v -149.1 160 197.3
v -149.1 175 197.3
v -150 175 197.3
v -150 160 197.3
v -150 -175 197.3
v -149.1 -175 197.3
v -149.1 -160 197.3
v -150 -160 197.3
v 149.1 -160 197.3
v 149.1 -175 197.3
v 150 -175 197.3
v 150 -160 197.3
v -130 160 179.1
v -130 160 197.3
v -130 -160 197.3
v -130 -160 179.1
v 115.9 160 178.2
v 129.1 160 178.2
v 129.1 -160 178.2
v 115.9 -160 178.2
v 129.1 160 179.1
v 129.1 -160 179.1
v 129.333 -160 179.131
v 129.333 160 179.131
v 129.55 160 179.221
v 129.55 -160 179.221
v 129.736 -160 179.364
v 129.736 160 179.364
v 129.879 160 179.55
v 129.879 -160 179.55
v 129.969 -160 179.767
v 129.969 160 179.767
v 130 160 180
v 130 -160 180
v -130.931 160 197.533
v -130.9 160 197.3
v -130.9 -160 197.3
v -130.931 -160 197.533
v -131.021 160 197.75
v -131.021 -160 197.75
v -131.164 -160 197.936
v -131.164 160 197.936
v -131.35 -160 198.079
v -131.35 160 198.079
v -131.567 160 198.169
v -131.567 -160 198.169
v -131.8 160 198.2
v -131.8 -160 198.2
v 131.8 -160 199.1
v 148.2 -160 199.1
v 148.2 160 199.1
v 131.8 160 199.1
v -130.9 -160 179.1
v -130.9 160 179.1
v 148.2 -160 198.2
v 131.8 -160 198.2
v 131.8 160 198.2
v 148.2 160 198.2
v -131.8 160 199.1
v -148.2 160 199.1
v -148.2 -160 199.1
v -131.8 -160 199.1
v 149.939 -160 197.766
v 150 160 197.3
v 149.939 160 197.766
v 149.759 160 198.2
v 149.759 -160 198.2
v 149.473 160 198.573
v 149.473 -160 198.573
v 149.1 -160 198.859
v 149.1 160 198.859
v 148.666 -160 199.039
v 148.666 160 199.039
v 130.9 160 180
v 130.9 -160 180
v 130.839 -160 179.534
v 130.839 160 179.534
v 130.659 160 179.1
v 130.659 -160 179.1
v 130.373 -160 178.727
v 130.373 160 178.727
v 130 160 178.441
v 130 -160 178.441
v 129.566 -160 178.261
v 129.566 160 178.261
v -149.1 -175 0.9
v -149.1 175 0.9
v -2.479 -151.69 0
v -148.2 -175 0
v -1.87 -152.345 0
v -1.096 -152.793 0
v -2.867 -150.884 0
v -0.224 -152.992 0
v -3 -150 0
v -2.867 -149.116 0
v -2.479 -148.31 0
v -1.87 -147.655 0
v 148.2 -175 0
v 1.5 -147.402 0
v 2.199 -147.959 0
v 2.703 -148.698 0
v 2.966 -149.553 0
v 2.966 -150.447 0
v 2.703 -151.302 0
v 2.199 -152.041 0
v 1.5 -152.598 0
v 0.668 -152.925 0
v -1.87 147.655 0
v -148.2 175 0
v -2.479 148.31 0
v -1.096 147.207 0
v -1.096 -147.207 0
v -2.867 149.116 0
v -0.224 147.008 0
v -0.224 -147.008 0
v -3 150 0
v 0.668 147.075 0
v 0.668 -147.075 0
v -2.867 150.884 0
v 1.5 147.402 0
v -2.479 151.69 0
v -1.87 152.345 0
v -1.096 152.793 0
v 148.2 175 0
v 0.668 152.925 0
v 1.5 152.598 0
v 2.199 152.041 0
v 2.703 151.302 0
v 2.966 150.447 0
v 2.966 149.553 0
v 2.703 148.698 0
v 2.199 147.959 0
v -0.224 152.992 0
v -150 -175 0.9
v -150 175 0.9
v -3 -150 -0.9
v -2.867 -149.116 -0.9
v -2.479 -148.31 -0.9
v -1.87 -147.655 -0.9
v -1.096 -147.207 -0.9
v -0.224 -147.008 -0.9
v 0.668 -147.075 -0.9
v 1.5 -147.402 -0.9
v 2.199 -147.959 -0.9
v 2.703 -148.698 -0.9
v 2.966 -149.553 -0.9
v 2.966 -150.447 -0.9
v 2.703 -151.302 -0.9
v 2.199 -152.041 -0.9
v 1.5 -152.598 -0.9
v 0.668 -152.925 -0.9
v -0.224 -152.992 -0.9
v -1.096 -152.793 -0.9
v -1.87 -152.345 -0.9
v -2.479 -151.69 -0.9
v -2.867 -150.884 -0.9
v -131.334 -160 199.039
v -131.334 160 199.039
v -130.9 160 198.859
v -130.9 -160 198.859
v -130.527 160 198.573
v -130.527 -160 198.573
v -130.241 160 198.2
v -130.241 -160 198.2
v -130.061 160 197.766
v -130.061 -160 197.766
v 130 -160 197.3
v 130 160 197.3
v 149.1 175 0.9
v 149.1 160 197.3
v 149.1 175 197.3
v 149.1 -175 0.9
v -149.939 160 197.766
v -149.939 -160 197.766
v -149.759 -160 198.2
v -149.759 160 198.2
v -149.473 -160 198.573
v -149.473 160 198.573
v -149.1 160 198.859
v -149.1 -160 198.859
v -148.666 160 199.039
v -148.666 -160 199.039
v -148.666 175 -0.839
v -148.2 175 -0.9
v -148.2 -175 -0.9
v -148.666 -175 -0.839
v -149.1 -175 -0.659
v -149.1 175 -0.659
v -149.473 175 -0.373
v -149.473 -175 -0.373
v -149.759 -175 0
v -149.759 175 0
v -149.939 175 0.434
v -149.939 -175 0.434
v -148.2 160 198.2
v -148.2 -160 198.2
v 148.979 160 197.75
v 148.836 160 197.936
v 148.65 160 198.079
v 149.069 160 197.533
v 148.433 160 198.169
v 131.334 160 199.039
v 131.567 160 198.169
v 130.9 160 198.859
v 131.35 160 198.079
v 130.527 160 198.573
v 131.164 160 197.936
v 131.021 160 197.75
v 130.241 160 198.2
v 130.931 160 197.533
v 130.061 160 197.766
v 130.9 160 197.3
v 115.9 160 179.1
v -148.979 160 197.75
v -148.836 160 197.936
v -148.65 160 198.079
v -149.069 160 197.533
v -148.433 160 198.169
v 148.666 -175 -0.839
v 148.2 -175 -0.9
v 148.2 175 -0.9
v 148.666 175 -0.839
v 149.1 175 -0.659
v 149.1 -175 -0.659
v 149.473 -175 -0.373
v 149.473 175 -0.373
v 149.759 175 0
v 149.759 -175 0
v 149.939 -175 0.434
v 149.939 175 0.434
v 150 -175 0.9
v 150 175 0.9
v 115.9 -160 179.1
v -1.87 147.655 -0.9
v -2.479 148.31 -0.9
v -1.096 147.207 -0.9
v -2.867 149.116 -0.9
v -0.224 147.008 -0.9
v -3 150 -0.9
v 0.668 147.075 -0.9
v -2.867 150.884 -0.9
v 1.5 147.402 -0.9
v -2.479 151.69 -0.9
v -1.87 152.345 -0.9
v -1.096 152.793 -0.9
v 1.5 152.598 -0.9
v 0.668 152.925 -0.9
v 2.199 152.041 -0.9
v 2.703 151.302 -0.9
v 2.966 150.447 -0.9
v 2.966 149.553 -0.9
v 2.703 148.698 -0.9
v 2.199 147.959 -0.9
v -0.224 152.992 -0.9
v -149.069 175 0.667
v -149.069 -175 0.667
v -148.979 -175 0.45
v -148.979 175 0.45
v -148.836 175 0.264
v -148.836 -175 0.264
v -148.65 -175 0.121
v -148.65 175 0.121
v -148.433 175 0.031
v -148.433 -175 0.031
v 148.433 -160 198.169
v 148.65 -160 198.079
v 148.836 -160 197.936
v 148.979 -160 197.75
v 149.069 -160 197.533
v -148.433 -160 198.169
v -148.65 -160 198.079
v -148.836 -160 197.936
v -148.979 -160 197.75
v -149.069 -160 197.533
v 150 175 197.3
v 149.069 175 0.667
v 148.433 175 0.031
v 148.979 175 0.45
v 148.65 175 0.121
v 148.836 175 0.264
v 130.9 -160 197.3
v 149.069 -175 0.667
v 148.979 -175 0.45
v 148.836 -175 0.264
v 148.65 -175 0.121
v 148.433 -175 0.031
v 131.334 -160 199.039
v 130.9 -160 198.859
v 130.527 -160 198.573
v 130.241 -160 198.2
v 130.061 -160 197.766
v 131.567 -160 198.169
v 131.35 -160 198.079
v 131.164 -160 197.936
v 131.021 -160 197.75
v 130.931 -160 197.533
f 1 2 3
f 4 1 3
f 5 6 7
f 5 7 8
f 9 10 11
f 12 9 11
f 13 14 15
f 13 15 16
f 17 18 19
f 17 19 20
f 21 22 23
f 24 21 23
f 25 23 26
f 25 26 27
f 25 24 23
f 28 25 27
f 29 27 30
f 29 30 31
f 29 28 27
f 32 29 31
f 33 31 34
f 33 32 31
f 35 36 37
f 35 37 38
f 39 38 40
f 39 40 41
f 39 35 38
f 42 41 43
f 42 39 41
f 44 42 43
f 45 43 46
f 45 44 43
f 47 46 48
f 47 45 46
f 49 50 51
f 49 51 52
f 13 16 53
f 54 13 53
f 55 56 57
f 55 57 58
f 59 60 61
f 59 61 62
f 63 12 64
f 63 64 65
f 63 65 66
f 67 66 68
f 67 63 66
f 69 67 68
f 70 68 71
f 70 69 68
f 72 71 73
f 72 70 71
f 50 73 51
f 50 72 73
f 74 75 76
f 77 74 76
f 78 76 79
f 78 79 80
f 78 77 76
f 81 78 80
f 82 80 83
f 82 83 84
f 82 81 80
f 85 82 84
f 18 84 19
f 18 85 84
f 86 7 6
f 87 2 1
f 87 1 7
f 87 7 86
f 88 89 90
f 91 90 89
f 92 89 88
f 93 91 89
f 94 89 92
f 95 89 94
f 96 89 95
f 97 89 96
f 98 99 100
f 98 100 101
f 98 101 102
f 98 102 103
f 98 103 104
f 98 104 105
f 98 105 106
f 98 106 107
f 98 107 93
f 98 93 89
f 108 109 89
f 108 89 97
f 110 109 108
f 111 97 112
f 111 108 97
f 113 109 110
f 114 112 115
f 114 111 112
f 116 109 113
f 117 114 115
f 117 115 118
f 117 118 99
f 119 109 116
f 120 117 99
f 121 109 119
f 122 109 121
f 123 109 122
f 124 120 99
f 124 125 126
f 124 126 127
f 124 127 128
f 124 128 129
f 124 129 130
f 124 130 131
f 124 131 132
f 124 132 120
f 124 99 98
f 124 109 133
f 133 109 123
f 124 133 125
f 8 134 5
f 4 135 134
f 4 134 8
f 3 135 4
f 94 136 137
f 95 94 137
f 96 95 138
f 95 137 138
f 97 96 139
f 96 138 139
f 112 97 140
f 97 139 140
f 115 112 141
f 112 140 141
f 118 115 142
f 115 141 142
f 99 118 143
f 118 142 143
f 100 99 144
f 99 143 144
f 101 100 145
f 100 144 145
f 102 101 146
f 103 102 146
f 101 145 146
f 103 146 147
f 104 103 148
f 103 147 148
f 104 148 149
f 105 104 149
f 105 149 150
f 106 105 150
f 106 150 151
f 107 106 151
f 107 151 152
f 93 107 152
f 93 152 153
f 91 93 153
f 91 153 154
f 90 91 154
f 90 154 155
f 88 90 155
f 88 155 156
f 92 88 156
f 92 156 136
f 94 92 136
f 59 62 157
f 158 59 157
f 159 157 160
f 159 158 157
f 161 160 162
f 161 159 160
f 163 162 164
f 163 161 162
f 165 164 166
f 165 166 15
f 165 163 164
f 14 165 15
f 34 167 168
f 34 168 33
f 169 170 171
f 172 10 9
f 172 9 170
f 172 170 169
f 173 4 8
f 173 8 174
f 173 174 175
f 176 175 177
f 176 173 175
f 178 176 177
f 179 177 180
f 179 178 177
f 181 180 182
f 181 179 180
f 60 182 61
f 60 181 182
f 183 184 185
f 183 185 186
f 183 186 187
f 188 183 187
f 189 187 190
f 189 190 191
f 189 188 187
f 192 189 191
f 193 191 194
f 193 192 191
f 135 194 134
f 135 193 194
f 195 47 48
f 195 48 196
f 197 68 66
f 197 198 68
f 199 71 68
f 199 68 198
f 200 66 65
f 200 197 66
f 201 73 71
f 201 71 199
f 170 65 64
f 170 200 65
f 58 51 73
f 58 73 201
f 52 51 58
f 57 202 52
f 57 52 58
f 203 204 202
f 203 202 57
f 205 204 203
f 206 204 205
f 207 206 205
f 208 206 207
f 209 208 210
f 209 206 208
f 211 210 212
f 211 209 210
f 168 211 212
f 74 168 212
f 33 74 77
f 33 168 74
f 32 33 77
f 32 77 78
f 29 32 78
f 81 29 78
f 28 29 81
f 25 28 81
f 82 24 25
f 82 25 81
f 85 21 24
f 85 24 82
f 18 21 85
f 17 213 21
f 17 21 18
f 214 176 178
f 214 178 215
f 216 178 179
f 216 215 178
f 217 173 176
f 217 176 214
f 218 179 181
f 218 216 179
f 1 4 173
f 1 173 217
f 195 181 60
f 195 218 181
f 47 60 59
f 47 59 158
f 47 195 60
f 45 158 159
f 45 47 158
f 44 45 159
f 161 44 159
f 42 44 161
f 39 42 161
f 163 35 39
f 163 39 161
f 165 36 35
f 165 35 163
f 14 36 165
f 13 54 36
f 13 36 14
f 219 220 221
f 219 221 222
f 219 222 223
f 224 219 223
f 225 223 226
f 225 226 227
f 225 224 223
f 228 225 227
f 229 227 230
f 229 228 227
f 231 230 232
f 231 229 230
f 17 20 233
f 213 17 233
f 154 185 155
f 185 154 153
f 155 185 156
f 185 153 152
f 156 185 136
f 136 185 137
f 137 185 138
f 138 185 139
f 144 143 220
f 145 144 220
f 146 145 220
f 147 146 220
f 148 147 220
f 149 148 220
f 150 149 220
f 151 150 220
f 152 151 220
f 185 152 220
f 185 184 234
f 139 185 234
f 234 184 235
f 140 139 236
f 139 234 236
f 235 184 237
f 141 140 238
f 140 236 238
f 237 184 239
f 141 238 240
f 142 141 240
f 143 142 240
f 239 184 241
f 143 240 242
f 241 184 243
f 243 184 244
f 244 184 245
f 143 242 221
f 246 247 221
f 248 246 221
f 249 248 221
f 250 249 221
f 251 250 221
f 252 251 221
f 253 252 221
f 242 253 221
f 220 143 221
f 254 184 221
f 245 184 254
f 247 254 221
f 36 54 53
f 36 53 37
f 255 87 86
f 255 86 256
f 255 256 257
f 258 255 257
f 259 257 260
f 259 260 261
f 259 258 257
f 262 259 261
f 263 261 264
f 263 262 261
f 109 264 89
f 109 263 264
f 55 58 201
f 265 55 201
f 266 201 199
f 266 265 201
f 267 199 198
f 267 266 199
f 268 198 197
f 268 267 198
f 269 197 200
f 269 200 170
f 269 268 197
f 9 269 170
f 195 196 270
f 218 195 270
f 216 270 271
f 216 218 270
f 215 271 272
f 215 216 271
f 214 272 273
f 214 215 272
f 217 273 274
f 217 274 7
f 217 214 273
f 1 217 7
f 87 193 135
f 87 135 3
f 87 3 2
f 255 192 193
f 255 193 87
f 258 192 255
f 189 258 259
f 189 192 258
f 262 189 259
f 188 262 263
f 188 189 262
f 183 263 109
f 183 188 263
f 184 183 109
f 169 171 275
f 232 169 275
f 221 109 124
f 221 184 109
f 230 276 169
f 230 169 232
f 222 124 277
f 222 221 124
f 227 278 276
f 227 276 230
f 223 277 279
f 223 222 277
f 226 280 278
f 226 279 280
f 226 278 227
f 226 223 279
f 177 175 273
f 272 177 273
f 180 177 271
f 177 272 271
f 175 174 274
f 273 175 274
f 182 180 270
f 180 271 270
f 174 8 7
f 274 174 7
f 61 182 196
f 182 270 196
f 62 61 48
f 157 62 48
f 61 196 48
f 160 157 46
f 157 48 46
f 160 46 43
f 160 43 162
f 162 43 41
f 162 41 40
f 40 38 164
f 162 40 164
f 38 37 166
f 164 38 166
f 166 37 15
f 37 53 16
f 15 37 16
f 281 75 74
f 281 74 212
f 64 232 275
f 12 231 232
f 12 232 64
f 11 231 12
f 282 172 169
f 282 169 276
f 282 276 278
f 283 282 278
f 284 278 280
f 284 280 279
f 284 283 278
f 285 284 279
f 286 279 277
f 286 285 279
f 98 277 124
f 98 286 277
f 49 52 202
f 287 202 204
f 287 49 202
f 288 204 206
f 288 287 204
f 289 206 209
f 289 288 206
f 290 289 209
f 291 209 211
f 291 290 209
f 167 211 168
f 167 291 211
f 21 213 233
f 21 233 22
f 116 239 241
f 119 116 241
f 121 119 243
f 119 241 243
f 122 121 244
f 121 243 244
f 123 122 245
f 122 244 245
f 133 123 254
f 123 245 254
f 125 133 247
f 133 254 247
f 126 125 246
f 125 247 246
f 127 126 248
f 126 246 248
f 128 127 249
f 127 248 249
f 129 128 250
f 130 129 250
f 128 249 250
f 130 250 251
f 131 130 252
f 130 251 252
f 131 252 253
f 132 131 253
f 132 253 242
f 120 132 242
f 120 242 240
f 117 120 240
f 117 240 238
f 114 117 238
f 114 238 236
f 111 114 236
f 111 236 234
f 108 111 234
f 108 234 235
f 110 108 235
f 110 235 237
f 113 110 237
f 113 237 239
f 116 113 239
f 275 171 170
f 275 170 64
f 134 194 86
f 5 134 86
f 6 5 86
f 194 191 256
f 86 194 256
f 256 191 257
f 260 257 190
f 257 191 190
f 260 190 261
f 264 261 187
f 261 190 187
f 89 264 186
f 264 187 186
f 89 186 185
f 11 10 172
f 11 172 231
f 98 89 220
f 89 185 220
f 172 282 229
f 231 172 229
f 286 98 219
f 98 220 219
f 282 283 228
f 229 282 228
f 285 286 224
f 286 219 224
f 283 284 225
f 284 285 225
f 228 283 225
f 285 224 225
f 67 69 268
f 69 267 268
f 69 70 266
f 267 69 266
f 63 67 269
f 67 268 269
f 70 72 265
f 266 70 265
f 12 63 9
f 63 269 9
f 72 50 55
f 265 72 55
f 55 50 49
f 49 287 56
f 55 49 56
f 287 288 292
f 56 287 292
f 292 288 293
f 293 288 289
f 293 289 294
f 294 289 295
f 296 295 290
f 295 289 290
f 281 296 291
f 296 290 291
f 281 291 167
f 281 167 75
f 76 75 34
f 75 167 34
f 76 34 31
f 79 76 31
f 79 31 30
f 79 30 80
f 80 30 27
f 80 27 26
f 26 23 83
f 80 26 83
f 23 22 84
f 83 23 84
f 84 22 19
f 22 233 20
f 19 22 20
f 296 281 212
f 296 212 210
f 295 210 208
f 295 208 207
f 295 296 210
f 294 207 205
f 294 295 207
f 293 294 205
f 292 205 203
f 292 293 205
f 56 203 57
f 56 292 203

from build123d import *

# Parameters (mm, degrees)
SKETCH1_W                      = 300
SKETCH1_H                      = 350
BASE_FLANGE1_DEPTH             = 0.9
EDGE_FLANGE1_STRIP_W           = 5.4
EDGE_FLANGE1_STRIP_H           = 0.9
EDGE_FLANGE1_STRIP_CUT_DEPTH   = 350
EDGE_FLANGE1_STRIP_2_W         = 5.4
EDGE_FLANGE1_STRIP_2_H         = 0.9
EDGE_FLANGE1_STRIP_CUT_2_DEPTH = 350
EDGE_FLANGE1_DEPTH             = 350
EDGE_FLANGE1_BEND_DEPTH        = 350
EDGE_FLANGE2_STRIP_W           = 5.4
EDGE_FLANGE2_STRIP_H           = 0.9
EDGE_FLANGE2_STRIP_CUT_DEPTH   = 350
EDGE_FLANGE2_STRIP_2_W         = 5.4
EDGE_FLANGE2_STRIP_2_H         = 0.9
EDGE_FLANGE2_STRIP_CUT_2_DEPTH = 350
EDGE_FLANGE2_DEPTH             = 350
EDGE_FLANGE2_BEND_DEPTH        = 350
EDGE_FLANGE3_STRIP_W           = 5.4
EDGE_FLANGE3_STRIP_H           = 0.9
EDGE_FLANGE3_STRIP_CUT_DEPTH   = 350
EDGE_FLANGE3_STRIP_2_W         = 5.4
EDGE_FLANGE3_STRIP_2_H         = 0.9
EDGE_FLANGE3_STRIP_CUT_2_DEPTH = 350
EDGE_FLANGE3_DEPTH             = 350
EDGE_FLANGE3_BEND_DEPTH        = 350
CUT_EXTRUDE1_START             = 160
CUT_EXTRUDE1_DEPTH             = 15
MIRROR2_START                  = 160
MIRROR2_COPY_1_DEPTH           = 15
EDGE_FLANGE4_STRIP_W           = 5.4
EDGE_FLANGE4_STRIP_H           = 0.9
EDGE_FLANGE4_STRIP_CUT_DEPTH   = 320
EDGE_FLANGE4_DEPTH             = 320
SKETCH28_R                     = 3
CUT_EXTRUDE2_DEPTH             = 10


# Read off the part's stored shape, not the designer's step: Cut-Extrude1
# Sheet-metal steps are written as plain solids
with BuildPart() as part:
    # Sketch1 → Base-Flange1 (new body)
    with BuildSketch(Plane.XY):
        Rectangle(SKETCH1_W, SKETCH1_H)
    extrude(amount=-BASE_FLANGE1_DEPTH)

    # Edge-Flange1 strip (across the edge) → Edge-Flange1 strip cut (cut)
    with BuildSketch(Plane(origin=(-150, 175, 0), x_dir=(1, 0, 0), z_dir=(0, -1, 0))):
        with Locations((-0.9, -0.45)):
            Rectangle(EDGE_FLANGE1_STRIP_W, EDGE_FLANGE1_STRIP_H)
    extrude(amount=EDGE_FLANGE1_STRIP_CUT_DEPTH, mode=Mode.SUBTRACT)

    # Edge-Flange1 strip 2 (across the edge) → Edge-Flange1 strip cut 2 (cut)
    with BuildSketch(Plane(origin=(150, -175, 0), x_dir=(-1, 0, 0), z_dir=(0, 1, 0))):
        with Locations((-0.9, -0.45)):
            Rectangle(EDGE_FLANGE1_STRIP_2_W, EDGE_FLANGE1_STRIP_2_H)
    extrude(amount=EDGE_FLANGE1_STRIP_CUT_2_DEPTH, mode=Mode.SUBTRACT)

    # Edge-Flange1 section (across the edge) → Edge-Flange1 (add)
    with BuildSketch(Plane(origin=(-150, 175, 0), x_dir=(1, 0, 0), z_dir=(0, -1, 0))):
        with BuildLine():
            Line((0, 0.9), (0, 199.1))
            Line((0, 199.1), (0.9, 199.1))
            Line((0.9, 199.1), (0.9, 0.9))
            ThreePointArc((0.9, 0.9), (1.163603897, 0.263603897), (1.8, 0))
            Line((1.8, 0), (1.8, -0.9))
            ThreePointArc((1.8, -0.9), (0.527207794, -0.372792206), (0, 0.9))
        make_face()
    extrude(amount=EDGE_FLANGE1_DEPTH)

    # Edge-Flange1 section 2 (across the edge) → Edge-Flange1 bend (add)
    with BuildSketch(Plane(origin=(150, -175, 0), x_dir=(-1, 0, 0), z_dir=(0, 1, 0))):
        with BuildLine():
            Line((0, 0.9), (0, 199.1))
            Line((0, 199.1), (0.9, 199.1))
            Line((0.9, 199.1), (0.9, 0.9))
            ThreePointArc((0.9, 0.9), (1.163603897, 0.263603897), (1.8, 0))
            Line((1.8, 0), (1.8, -0.9))
            ThreePointArc((1.8, -0.9), (0.527207794, -0.372792206), (0, 0.9))
        make_face()
    extrude(amount=EDGE_FLANGE1_BEND_DEPTH)

    # Edge-Flange2 strip (across the edge) → Edge-Flange2 strip cut (cut)
    with BuildSketch(Plane(origin=(-149.1, 175, 199.1), x_dir=(0, 0, -1), z_dir=(0, -1, 0))):
        with Locations((-0.9, -0.45)):
            Rectangle(EDGE_FLANGE2_STRIP_W, EDGE_FLANGE2_STRIP_H)
    extrude(amount=EDGE_FLANGE2_STRIP_CUT_DEPTH, mode=Mode.SUBTRACT)

    # Edge-Flange2 strip 2 (across the edge) → Edge-Flange2 strip cut 2 (cut)
    with BuildSketch(Plane(origin=(149.1, -175, 199.1), x_dir=(0, 0, -1), z_dir=(0, 1, 0))):
        with Locations((-0.9, -0.45)):
            Rectangle(EDGE_FLANGE2_STRIP_2_W, EDGE_FLANGE2_STRIP_2_H)
    extrude(amount=EDGE_FLANGE2_STRIP_CUT_2_DEPTH, mode=Mode.SUBTRACT)

    # Edge-Flange2 section (across the edge) → Edge-Flange2 (add)
    with BuildSketch(Plane(origin=(-149.1, 175, 199.1), x_dir=(0, 0, -1), z_dir=(0, -1, 0))):
        with BuildLine():
            Line((0, 0.9), (0, 19.1))
            Line((0, 19.1), (0.9, 19.1))
            Line((0.9, 19.1), (0.9, 0.9))
            ThreePointArc((0.9, 0.9), (1.163603897, 0.263603897), (1.8, 0))
            Line((1.8, 0), (1.8, -0.9))
            ThreePointArc((1.8, -0.9), (0.527207794, -0.372792206), (0, 0.9))
        make_face()
    extrude(amount=EDGE_FLANGE2_DEPTH)

    # Edge-Flange2 section 2 (across the edge) → Edge-Flange2 bend (add)
    with BuildSketch(Plane(origin=(149.1, -175, 199.1), x_dir=(0, 0, -1), z_dir=(0, 1, 0))):
        with BuildLine():
            Line((0, 0.9), (0, 19.1))
            Line((0, 19.1), (0.9, 19.1))
            Line((0.9, 19.1), (0.9, 0.9))
            ThreePointArc((0.9, 0.9), (1.163603897, 0.263603897), (1.8, 0))
            Line((1.8, 0), (1.8, -0.9))
            ThreePointArc((1.8, -0.9), (0.527207794, -0.372792206), (0, 0.9))
        make_face()
    extrude(amount=EDGE_FLANGE2_BEND_DEPTH)

    # Edge-Flange3 strip (across the edge) → Edge-Flange3 strip cut (cut)
    with BuildSketch(Plane(origin=(130, -175, 198.2), x_dir=(1, 0, 0), z_dir=(0, 1, 0))):
        with Locations((-0.9, -0.45)):
            Rectangle(EDGE_FLANGE3_STRIP_W, EDGE_FLANGE3_STRIP_H)
    extrude(amount=EDGE_FLANGE3_STRIP_CUT_DEPTH, mode=Mode.SUBTRACT)

    # Edge-Flange3 strip 2 (across the edge) → Edge-Flange3 strip cut 2 (cut)
    with BuildSketch(Plane(origin=(-130, 175, 198.2), x_dir=(-1, 0, 0), z_dir=(0, -1, 0))):
        with Locations((-0.9, -0.45)):
            Rectangle(EDGE_FLANGE3_STRIP_2_W, EDGE_FLANGE3_STRIP_2_H)
    extrude(amount=EDGE_FLANGE3_STRIP_CUT_2_DEPTH, mode=Mode.SUBTRACT)

    # Edge-Flange3 section (across the edge) → Edge-Flange3 (add)
    with BuildSketch(Plane(origin=(130, -175, 198.2), x_dir=(1, 0, 0), z_dir=(0, 1, 0))):
        with BuildLine():
            Line((0, 0.9), (0, 19.1))
            Line((0, 19.1), (0.9, 19.1))
            Line((0.9, 19.1), (0.9, 0.9))
            ThreePointArc((0.9, 0.9), (1.163603897, 0.263603897), (1.8, 0))
            Line((1.8, 0), (1.8, -0.9))
            ThreePointArc((1.8, -0.9), (0.527207794, -0.372792206), (0, 0.9))
        make_face()
    extrude(amount=EDGE_FLANGE3_DEPTH)

    # Edge-Flange3 section 2 (across the edge) → Edge-Flange3 bend (add)
    with BuildSketch(Plane(origin=(-130, 175, 198.2), x_dir=(-1, 0, 0), z_dir=(0, -1, 0))):
        with BuildLine():
            Line((0, 0.9), (0, 19.1))
            Line((0, 19.1), (0.9, 19.1))
            Line((0.9, 19.1), (0.9, 0.9))
            ThreePointArc((0.9, 0.9), (1.163603897, 0.263603897), (1.8, 0))
            Line((1.8, 0), (1.8, -0.9))
            ThreePointArc((1.8, -0.9), (0.527207794, -0.372792206), (0, 0.9))
        make_face()
    extrude(amount=EDGE_FLANGE3_BEND_DEPTH)

    # Cut-Extrude1 outline → Cut-Extrude1 (cut)
    with BuildSketch(Plane(origin=(0, 0, 0), x_dir=(1, 0, 0), z_dir=(0, 1, 0)).offset(CUT_EXTRUDE1_START)):
        with BuildLine():
            ThreePointArc((-148.2, -198.2), (-148.836396103, -197.936396103), (-149.1, -197.3))
            Line((-149.1, -197.3), (-150, -197.3))
            ThreePointArc((-150, -197.3), (-149.472792206, -198.572792206), (-148.2, -199.1))
            Line((-148.2, -199.1), (-131.8, -199.1))
            ThreePointArc((-131.8, -199.1), (-130.527207794, -198.572792206), (-130, -197.3))
            Line((-130, -197.3), (-130, -179.1))
            Line((-130, -179.1), (-130.9, -179.1))
            Line((-130.9, -179.1), (-130.9, -197.3))
            ThreePointArc((-130.9, -197.3), (-131.163603897, -197.936396103), (-131.8, -198.2))
            Line((-131.8, -198.2), (-148.2, -198.2))
        make_face()
    cut_extrude1 = extrude(amount=CUT_EXTRUDE1_DEPTH, mode=Mode.SUBTRACT)

    # Mirror1: Cut-Extrude1 across plane
    add(cut_extrude1.mirror(Plane(origin=(0, 0, 0), x_dir=(0, 0, 1), z_dir=(1, 0, 0))), mode=Mode.SUBTRACT)

    # Mirror2: Cut-Extrude1 across plane
    add(cut_extrude1.mirror(Plane.ZX), mode=Mode.SUBTRACT)

    # Mirror2 copy 1 sketch → Mirror2 copy 1 (cut)
    with BuildSketch(Plane(origin=(0, 0, 0), x_dir=(-1, 0, 0), z_dir=(0, -1, 0)).offset(MIRROR2_START)):
        with BuildLine():
            ThreePointArc((-148.2, -198.2), (-148.836396103, -197.936396103), (-149.1, -197.3))
            Line((-149.1, -197.3), (-150, -197.3))
            ThreePointArc((-150, -197.3), (-149.472792206, -198.572792206), (-148.2, -199.1))
            Line((-148.2, -199.1), (-131.8, -199.1))
            ThreePointArc((-131.8, -199.1), (-130.527207794, -198.572792206), (-130, -197.3))
            Line((-130, -197.3), (-130, -179.1))
            Line((-130, -179.1), (-130.9, -179.1))
            Line((-130.9, -179.1), (-130.9, -197.3))
            ThreePointArc((-130.9, -197.3), (-131.163603897, -197.936396103), (-131.8, -198.2))
            Line((-131.8, -198.2), (-148.2, -198.2))
        make_face()
    extrude(amount=MIRROR2_COPY_1_DEPTH, mode=Mode.SUBTRACT)

    # Edge-Flange4 strip (across the edge) → Edge-Flange4 strip cut (cut)
    with BuildSketch(Plane(origin=(130, 160, 179.1), x_dir=(0, 0, 1), z_dir=(0, -1, 0))):
        with Locations((-1.8, -0.45)):
            Rectangle(EDGE_FLANGE4_STRIP_W, EDGE_FLANGE4_STRIP_H)
    extrude(amount=EDGE_FLANGE4_STRIP_CUT_DEPTH, mode=Mode.SUBTRACT)

    # Edge-Flange4 section (across the edge) → Edge-Flange4 (add)
    with BuildSketch(Plane(origin=(130, 160, 179.1), x_dir=(0, 0, 1), z_dir=(0, -1, 0))):
        with BuildLine():
            Line((-0.9, 0.9), (-0.9, 14.1))
            Line((-0.9, 14.1), (0, 14.1))
            Line((0, 14.1), (0, 0.9))
            ThreePointArc((0, 0.9), (0.263603897, 0.263603897), (0.9, 0))
            Line((0.9, 0), (0.9, -0.9))
            ThreePointArc((0.9, -0.9), (-0.372792206, -0.372792206), (-0.9, 0.9))
        make_face()
    extrude(amount=EDGE_FLANGE4_DEPTH)

    # Sketch28 → Cut-Extrude2 (cut)
    with BuildSketch(Plane(origin=(0, 0, -0.9), x_dir=(-1, 0, 0), z_dir=(0, 0, -1))):
        with Locations((0, 150)):
            Circle(SKETCH28_R)
        with Locations((0, -150)):
            Circle(SKETCH28_R)
    extrude(amount=-CUT_EXTRUDE2_DEPTH, mode=Mode.SUBTRACT)


solid = part.part
